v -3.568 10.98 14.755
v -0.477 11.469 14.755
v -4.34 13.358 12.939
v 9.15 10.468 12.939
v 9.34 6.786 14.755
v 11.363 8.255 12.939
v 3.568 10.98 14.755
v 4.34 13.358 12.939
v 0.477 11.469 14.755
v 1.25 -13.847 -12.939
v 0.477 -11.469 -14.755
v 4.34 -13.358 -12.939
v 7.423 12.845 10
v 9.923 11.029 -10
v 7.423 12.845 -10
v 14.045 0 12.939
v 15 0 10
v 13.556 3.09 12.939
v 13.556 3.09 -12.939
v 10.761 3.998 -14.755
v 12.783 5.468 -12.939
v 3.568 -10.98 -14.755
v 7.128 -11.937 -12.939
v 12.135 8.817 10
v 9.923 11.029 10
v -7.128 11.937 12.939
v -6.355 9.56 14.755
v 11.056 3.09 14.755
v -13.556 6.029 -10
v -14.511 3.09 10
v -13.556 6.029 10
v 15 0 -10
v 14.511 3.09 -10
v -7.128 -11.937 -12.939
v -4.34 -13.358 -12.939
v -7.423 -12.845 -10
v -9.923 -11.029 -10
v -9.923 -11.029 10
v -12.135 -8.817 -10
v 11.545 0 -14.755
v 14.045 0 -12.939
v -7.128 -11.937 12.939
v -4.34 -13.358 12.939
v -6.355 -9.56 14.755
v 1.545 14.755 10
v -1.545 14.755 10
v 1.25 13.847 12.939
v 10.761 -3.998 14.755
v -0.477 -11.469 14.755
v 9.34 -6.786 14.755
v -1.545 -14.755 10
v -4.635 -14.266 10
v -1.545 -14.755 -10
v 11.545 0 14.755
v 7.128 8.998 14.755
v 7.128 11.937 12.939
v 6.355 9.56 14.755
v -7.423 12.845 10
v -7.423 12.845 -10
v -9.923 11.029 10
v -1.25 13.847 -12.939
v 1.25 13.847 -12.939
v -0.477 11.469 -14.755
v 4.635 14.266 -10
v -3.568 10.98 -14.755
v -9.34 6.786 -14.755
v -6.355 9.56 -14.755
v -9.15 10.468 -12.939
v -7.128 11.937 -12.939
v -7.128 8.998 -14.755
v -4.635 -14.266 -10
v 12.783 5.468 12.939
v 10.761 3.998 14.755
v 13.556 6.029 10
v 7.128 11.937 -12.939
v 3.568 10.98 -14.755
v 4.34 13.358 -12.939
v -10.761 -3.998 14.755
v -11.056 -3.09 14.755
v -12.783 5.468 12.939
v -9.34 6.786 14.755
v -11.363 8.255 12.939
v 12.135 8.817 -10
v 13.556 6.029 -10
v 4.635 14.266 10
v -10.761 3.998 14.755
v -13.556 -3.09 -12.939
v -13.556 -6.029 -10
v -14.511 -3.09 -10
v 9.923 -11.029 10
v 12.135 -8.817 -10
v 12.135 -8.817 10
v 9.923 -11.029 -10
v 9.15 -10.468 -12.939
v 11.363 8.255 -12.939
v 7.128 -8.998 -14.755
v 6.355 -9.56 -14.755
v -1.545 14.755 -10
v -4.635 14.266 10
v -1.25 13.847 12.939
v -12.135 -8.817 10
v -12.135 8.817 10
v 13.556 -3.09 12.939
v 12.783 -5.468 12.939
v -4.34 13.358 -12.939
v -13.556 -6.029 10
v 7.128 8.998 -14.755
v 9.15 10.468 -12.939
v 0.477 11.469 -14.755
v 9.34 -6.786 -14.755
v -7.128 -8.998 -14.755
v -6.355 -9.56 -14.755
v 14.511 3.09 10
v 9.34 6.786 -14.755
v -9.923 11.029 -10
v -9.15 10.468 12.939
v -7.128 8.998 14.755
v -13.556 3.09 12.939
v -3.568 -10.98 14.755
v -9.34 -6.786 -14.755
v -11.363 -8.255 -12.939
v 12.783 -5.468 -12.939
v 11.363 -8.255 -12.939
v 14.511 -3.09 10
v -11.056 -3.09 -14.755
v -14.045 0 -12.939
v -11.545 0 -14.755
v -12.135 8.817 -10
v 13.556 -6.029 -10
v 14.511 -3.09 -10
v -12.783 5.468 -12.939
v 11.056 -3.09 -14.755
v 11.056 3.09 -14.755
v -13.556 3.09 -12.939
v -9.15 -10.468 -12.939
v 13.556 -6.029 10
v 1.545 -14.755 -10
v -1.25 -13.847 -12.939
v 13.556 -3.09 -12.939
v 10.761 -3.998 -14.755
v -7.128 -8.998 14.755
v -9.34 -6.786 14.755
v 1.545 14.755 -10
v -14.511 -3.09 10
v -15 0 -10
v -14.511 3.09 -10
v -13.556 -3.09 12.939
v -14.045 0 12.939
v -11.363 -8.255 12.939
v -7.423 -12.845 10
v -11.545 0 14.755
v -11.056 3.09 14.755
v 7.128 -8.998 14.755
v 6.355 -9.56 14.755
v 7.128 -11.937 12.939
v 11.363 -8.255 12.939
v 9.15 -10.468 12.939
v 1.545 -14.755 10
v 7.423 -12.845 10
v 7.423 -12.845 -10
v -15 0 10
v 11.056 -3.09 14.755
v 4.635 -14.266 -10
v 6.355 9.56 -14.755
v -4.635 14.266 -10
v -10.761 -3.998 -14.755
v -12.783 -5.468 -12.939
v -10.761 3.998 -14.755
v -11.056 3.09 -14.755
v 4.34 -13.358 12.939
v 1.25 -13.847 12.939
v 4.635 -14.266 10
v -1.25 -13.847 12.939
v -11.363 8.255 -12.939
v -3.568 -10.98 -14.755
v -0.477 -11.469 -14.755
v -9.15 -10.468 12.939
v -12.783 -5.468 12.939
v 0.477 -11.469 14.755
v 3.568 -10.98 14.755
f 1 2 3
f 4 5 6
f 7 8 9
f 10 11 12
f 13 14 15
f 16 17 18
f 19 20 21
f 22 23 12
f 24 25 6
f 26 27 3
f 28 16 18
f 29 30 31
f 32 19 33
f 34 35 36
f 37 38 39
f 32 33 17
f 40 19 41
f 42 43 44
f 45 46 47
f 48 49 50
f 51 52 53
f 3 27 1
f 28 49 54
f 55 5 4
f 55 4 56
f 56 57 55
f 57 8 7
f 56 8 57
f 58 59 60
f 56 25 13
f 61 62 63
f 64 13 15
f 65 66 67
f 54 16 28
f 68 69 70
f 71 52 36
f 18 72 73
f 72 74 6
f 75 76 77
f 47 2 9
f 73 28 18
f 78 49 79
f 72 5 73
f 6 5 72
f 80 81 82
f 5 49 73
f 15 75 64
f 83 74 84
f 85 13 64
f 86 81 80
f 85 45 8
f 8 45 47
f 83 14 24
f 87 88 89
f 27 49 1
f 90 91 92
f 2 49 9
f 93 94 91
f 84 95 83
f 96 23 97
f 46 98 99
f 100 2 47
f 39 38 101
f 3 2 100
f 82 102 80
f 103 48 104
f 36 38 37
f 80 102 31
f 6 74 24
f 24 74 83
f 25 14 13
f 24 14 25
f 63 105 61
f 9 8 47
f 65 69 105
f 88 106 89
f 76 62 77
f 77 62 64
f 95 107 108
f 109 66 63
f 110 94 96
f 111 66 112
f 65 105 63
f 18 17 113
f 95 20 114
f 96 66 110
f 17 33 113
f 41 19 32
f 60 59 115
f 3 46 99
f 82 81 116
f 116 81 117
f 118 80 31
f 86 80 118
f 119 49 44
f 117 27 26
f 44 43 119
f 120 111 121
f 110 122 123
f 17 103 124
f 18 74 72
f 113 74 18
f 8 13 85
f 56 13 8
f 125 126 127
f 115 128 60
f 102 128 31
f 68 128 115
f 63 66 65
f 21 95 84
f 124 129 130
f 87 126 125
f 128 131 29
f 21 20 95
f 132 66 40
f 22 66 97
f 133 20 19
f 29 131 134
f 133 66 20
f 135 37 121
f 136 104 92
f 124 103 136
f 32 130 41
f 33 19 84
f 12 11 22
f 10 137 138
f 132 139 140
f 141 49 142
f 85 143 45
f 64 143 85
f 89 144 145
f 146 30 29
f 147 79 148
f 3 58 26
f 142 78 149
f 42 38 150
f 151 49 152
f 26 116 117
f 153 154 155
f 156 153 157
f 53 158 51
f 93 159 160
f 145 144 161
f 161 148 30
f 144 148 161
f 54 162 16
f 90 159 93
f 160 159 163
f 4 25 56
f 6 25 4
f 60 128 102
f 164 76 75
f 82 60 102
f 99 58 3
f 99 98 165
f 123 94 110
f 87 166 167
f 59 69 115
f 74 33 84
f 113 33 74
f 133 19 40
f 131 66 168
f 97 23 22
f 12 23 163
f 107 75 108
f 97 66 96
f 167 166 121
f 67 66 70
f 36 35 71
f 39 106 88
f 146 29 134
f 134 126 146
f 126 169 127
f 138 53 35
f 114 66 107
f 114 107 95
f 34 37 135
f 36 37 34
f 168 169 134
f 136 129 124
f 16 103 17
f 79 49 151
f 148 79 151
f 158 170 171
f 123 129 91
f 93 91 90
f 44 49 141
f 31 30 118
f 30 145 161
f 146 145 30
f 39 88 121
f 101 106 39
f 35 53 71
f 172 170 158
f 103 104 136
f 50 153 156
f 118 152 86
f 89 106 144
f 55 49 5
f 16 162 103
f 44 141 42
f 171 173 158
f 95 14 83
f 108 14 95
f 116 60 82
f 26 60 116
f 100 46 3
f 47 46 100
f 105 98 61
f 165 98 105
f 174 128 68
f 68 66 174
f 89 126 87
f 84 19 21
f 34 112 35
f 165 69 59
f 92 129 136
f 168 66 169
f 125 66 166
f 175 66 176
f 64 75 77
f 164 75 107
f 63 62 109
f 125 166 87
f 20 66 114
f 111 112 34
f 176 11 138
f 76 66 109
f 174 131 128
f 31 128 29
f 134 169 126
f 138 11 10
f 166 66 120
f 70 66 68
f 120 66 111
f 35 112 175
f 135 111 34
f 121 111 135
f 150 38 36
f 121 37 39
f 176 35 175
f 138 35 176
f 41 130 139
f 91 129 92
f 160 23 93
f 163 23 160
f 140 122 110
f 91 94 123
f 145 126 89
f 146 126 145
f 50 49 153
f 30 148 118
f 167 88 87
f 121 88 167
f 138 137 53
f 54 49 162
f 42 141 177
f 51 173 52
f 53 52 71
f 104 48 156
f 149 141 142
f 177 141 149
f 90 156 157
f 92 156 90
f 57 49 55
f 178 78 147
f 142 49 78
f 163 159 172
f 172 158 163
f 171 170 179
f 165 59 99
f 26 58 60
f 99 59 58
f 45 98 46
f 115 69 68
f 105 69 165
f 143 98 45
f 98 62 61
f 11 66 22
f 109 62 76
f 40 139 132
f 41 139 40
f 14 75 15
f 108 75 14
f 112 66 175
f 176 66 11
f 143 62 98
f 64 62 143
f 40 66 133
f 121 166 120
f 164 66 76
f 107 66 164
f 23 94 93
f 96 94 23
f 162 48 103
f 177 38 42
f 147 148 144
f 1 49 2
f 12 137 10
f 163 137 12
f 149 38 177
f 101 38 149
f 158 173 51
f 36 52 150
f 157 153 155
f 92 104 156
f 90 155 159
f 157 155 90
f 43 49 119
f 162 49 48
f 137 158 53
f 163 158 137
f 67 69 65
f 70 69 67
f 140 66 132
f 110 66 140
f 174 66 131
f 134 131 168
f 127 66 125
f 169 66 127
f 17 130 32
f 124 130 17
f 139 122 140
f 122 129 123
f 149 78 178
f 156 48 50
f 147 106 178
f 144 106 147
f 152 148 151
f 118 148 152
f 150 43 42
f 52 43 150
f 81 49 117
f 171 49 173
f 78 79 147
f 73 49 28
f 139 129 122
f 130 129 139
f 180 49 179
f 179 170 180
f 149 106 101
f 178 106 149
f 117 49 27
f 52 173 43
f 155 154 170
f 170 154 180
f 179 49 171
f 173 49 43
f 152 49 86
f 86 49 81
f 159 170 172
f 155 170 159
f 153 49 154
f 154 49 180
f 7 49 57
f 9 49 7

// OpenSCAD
minkowski()
{
	// cube([40, 40, 5],center=true);
	sphere(r=5,$fn=10);
	cylinder(r=10,h=20,center=true,$fn=20);
	// cylinder(r=2.5,h=5,center=true,$fn=20);
}
